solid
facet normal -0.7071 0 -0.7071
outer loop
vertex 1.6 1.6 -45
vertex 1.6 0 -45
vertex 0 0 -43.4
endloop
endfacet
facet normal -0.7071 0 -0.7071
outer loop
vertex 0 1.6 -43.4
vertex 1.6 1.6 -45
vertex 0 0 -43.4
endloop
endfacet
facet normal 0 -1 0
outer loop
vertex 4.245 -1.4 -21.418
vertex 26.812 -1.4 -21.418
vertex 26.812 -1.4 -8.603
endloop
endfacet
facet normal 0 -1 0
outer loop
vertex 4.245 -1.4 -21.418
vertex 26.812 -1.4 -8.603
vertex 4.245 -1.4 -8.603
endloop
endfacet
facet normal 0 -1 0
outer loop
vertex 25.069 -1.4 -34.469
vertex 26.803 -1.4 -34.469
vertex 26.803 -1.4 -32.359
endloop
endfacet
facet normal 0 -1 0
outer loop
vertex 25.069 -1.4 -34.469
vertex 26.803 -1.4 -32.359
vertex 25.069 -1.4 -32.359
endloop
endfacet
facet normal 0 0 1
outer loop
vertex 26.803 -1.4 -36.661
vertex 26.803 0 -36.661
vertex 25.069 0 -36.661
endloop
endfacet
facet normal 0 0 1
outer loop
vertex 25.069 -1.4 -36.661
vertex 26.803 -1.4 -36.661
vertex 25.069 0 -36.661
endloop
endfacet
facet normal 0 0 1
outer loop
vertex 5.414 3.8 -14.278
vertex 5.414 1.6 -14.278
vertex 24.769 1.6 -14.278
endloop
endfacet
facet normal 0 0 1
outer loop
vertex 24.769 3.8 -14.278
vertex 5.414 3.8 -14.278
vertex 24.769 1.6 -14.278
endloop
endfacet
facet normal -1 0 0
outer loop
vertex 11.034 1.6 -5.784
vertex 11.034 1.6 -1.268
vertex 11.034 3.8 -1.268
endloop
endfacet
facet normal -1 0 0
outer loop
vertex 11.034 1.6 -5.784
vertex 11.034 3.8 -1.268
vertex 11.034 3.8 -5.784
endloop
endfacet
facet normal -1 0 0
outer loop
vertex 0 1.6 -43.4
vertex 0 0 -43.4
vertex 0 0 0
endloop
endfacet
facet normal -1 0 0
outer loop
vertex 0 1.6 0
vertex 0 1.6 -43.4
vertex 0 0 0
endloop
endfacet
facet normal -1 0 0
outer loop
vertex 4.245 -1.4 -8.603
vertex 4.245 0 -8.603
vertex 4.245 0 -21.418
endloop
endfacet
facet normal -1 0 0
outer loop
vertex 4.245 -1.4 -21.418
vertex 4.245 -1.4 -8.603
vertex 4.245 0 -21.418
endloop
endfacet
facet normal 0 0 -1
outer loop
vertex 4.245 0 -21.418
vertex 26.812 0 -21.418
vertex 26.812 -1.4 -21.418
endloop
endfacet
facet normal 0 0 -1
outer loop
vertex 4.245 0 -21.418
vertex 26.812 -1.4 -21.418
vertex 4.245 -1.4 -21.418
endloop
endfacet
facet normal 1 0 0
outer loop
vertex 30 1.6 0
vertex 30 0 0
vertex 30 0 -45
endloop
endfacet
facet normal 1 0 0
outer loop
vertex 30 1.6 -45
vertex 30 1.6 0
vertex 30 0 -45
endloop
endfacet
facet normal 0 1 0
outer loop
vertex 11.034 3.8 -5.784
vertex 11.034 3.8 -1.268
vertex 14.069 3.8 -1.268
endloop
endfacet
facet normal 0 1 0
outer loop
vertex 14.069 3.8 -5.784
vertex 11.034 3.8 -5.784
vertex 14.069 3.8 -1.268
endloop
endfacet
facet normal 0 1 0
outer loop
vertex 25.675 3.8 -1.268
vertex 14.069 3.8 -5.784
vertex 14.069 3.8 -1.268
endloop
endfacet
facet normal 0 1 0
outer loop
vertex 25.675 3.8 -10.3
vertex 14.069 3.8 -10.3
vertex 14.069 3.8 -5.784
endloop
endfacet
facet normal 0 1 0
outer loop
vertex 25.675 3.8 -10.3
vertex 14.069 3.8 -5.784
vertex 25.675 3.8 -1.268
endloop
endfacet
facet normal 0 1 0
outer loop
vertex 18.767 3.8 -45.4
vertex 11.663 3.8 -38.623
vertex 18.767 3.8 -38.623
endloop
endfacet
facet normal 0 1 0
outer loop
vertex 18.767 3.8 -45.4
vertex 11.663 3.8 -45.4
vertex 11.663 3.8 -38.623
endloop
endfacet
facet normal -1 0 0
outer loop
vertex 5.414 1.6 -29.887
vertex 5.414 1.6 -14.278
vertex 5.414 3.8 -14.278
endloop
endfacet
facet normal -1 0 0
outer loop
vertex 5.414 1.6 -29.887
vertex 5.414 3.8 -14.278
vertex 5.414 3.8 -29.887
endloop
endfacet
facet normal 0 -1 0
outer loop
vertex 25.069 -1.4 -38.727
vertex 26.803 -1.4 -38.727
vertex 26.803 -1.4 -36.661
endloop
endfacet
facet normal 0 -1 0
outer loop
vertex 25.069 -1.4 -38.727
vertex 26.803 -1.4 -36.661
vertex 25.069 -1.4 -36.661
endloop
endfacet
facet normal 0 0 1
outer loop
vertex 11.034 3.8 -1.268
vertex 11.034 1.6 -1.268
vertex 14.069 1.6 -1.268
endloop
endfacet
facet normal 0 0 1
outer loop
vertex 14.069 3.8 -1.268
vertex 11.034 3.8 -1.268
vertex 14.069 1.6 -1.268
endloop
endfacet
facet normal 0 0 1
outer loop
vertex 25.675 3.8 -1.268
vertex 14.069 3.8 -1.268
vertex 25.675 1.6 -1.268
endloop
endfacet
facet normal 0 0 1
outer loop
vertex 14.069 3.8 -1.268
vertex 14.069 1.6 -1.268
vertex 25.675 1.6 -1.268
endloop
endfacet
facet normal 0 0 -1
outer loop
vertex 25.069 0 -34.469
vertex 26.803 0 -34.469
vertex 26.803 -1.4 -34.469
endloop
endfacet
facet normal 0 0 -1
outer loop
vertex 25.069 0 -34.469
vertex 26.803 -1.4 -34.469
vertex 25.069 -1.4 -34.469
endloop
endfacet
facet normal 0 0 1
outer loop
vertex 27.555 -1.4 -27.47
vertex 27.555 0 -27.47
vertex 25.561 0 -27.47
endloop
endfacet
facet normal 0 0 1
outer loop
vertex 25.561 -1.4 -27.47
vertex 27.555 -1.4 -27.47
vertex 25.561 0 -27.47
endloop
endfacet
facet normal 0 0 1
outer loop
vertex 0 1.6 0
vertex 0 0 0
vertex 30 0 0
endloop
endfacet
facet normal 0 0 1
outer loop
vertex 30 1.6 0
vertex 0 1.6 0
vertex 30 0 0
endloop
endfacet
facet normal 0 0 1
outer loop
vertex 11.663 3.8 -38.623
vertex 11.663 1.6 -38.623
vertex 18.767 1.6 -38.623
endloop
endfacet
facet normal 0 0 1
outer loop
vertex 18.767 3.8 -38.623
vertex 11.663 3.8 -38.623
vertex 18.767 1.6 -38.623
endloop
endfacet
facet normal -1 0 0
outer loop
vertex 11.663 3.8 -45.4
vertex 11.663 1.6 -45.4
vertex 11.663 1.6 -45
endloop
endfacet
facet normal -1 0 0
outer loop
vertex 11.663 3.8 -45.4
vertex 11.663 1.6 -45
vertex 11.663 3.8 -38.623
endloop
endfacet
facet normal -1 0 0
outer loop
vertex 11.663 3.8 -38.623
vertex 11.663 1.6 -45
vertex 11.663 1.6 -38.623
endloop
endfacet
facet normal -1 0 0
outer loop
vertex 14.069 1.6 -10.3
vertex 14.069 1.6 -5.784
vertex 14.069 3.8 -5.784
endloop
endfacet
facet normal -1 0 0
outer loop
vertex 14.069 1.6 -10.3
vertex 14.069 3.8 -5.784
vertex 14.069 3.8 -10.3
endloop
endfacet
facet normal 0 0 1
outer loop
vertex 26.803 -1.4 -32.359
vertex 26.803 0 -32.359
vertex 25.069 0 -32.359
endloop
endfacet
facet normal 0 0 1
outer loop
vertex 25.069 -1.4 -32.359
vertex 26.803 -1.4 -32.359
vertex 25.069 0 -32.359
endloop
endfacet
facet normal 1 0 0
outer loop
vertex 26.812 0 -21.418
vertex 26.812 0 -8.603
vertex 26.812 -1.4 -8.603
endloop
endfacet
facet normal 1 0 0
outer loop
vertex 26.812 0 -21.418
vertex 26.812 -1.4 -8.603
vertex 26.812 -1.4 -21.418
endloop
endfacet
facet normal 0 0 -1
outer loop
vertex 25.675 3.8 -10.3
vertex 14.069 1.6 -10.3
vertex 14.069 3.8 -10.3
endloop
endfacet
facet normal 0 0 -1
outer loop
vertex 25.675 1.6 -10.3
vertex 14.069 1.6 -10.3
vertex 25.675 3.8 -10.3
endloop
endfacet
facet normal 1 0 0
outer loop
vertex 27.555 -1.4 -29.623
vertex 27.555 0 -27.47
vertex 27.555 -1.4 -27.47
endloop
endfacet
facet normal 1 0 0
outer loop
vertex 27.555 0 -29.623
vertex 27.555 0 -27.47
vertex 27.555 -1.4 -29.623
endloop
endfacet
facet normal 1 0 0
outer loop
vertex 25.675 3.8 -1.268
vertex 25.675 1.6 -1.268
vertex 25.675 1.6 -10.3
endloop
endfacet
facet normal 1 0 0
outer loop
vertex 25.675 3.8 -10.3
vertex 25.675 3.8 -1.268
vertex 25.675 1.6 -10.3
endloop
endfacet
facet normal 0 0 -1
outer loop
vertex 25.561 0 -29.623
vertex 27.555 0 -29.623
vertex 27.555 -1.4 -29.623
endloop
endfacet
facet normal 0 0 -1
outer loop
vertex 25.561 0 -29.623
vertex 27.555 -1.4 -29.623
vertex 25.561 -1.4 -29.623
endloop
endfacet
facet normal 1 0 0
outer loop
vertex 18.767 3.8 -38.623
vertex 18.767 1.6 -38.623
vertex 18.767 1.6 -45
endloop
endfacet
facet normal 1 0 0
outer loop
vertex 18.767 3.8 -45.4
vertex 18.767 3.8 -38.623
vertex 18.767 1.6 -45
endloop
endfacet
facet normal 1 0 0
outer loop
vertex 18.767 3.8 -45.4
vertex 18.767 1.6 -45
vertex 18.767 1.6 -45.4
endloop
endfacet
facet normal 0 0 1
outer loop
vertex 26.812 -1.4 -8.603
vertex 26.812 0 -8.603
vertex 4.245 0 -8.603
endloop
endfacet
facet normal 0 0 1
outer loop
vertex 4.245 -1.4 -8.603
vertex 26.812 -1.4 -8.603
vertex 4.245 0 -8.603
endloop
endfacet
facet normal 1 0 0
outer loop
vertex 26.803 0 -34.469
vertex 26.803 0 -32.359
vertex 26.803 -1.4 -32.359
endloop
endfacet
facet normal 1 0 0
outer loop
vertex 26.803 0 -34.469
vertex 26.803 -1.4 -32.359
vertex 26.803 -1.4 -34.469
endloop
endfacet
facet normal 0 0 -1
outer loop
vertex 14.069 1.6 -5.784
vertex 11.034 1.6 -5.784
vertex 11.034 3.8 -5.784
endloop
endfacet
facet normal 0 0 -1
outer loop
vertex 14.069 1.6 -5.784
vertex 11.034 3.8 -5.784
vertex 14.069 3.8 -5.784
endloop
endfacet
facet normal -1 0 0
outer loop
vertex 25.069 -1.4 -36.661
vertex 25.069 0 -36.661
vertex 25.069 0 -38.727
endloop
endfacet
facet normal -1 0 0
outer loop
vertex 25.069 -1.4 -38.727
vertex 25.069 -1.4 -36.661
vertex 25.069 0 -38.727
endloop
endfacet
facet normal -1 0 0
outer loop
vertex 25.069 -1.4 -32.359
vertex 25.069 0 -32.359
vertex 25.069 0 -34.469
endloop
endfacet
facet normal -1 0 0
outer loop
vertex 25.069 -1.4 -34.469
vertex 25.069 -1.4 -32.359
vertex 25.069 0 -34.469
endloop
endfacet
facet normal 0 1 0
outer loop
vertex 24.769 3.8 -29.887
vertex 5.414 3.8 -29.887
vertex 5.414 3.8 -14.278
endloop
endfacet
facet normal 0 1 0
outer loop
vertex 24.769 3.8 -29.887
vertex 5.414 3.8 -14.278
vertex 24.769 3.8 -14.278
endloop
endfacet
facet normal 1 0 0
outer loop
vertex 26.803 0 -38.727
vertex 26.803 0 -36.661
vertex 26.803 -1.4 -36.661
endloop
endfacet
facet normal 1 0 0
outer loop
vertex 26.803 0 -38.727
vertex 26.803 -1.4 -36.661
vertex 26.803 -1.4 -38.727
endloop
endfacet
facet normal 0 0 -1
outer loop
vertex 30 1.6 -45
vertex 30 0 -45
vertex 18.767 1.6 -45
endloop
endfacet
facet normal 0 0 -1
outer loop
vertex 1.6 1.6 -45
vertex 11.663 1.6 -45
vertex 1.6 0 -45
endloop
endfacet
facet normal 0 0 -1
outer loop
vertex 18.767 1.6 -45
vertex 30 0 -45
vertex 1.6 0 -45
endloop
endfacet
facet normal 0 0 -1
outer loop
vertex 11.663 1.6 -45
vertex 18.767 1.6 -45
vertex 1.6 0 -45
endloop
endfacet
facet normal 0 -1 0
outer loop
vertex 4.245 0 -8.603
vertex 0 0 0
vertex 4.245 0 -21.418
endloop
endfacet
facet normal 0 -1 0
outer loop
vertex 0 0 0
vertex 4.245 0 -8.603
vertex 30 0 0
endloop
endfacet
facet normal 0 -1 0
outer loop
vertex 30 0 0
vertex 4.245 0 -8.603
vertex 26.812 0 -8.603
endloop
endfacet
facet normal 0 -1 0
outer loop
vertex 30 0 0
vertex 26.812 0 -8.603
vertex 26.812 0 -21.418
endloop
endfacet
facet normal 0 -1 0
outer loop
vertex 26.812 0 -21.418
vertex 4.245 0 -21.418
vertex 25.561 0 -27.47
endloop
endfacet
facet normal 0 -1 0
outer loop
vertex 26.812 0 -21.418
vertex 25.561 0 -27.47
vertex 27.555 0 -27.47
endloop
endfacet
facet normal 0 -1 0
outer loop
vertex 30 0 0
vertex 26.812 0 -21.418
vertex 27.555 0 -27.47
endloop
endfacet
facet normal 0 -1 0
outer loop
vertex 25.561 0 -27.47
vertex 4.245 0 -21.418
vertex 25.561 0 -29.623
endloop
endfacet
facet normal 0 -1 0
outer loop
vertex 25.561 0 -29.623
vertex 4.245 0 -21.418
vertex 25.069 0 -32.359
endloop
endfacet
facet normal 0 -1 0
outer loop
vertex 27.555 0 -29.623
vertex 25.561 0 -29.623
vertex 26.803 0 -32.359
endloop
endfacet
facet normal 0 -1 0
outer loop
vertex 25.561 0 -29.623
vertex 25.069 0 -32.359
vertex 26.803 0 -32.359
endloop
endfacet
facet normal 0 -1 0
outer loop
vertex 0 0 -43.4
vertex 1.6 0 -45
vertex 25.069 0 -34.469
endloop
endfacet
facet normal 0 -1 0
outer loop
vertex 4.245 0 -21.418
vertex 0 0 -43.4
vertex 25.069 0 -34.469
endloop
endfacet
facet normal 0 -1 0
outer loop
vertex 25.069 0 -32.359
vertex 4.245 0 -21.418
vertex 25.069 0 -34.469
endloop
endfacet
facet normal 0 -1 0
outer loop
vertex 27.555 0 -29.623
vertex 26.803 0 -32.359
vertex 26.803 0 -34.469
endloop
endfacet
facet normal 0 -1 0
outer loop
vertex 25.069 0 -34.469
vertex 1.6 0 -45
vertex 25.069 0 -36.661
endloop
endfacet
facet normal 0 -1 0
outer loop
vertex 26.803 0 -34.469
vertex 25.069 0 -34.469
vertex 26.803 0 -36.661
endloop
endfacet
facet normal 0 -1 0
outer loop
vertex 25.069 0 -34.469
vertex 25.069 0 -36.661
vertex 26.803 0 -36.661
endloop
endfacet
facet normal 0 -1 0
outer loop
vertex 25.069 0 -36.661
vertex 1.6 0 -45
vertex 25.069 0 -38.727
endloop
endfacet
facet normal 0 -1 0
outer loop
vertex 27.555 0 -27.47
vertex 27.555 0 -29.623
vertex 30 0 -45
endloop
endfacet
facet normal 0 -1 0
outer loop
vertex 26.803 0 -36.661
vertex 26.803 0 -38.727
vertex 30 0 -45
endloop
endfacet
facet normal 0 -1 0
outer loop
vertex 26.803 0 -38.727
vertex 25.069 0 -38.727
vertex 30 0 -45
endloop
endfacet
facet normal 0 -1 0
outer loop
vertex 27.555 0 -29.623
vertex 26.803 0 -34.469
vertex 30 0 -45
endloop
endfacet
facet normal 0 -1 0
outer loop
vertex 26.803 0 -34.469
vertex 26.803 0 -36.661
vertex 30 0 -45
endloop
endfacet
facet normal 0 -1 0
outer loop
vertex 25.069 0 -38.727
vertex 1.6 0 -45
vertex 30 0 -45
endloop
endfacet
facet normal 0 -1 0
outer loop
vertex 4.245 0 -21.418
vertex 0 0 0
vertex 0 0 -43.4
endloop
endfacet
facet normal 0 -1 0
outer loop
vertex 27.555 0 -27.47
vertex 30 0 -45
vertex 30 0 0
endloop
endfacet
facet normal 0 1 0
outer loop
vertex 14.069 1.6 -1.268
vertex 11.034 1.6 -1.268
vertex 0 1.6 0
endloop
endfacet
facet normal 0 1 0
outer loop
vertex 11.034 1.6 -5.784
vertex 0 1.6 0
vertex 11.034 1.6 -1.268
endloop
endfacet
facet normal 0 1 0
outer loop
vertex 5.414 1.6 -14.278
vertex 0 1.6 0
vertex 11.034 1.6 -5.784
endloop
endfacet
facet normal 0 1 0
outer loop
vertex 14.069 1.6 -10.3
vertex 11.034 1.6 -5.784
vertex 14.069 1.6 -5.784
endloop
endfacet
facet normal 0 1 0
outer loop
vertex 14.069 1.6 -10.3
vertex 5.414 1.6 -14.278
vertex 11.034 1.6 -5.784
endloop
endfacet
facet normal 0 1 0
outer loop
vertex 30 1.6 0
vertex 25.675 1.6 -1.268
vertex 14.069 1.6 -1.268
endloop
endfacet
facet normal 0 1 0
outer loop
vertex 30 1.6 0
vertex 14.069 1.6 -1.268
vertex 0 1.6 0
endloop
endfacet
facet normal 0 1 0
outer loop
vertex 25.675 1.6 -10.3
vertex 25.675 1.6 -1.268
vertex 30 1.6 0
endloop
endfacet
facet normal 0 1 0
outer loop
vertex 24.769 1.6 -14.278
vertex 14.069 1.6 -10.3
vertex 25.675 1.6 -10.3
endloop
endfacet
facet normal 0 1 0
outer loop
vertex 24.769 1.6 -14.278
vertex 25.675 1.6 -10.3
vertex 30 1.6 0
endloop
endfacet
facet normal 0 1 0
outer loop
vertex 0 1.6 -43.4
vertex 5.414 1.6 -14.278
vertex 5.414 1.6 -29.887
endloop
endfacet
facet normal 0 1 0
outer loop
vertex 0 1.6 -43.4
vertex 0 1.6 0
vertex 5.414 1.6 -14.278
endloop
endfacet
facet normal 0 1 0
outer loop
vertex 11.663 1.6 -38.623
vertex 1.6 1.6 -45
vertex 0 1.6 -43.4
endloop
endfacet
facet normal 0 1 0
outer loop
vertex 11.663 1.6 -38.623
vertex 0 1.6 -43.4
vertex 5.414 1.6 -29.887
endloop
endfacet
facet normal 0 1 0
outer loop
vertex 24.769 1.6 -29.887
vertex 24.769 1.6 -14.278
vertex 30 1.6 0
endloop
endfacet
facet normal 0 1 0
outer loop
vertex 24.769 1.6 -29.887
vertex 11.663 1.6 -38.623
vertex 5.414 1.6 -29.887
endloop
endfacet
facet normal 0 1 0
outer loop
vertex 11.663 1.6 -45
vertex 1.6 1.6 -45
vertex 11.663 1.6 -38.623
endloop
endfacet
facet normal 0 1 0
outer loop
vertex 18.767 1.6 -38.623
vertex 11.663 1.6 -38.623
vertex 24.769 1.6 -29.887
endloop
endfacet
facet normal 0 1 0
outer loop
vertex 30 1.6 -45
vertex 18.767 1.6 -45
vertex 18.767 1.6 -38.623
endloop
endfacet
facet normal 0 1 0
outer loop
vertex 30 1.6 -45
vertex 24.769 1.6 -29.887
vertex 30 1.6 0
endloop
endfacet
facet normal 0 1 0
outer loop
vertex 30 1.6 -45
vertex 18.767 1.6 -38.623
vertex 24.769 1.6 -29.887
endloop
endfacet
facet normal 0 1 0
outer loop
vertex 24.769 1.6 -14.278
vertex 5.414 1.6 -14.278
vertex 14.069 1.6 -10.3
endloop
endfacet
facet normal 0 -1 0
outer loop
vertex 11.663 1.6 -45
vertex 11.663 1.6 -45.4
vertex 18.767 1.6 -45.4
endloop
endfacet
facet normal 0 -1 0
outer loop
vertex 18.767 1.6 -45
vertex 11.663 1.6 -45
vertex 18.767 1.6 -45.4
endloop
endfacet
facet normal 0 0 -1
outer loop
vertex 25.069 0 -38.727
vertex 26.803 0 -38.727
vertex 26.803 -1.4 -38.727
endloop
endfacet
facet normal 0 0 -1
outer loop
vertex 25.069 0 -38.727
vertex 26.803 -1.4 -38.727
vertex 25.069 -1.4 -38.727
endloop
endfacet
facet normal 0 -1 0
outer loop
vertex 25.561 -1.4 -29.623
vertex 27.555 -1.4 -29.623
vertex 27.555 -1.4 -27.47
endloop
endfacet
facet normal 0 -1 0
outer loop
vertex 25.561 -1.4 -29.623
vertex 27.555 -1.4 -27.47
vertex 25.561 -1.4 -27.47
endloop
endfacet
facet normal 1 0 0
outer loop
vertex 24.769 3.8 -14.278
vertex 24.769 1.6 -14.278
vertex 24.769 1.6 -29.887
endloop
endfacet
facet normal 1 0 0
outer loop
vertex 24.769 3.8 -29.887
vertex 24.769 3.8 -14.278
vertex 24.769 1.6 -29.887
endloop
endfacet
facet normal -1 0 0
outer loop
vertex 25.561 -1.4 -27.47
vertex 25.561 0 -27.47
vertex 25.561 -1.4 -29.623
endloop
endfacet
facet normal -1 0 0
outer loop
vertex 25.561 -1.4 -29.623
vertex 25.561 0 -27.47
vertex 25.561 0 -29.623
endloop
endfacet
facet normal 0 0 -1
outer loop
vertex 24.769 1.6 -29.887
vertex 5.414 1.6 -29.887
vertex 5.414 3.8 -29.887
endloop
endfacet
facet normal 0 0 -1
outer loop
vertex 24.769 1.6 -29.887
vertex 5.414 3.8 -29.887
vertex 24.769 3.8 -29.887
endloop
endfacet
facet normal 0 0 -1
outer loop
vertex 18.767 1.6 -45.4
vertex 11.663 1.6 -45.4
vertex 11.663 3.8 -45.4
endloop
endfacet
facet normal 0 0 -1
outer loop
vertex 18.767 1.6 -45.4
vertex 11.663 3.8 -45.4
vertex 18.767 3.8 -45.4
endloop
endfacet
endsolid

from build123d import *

# Parameters (mm, degrees)
BOSS_EXTRUDE1_DEPTH = 1.6
SKETCH3_W           = 19.355079094
SKETCH3_H           = 15.609116434
BOSS_EXTRUDE2_DEPTH = 2.2
SKETCH4_W           = 7.104895368
SKETCH4_H           = 6.377418
SKETCH4_H_2         = 0.4
BOSS_EXTRUDE4_DEPTH = 2.2
SKETCH5_W           = 22.566472962
SKETCH5_H           = 12.815854083
BOSS_EXTRUDE5_DEPTH = 1.4
SKETCH6_W           = 1.734301273
SKETCH6_H           = 2.066889472
SKETCH6_H_2         = 2.110641646
SKETCH6_W_2         = 1.994894676
SKETCH6_H_3         = 2.153908206
BOSS_EXTRUDE6_DEPTH = 1.4
SKETCH7_W           = 11.606028653
SKETCH7_H           = 9.032244077
SKETCH7_W_2         = 3.035472579
SKETCH7_H_2         = 4.516122038
BOSS_EXTRUDE7_DEPTH = 2.2


with BuildPart() as part:
    # Sketch2 → Boss-Extrude1 (new body)
    with BuildSketch(Plane(origin=(0, 0, 0), x_dir=(1, 0, 0), z_dir=(0, 1, 0))):
        Polygon((1.6, 45), (0, 43.4), (0, 0), (30, 0), (30, 45), align=None)
    extrude(amount=BOSS_EXTRUDE1_DEPTH)

    # Sketch3 → Boss-Extrude2 (add)
    with BuildSketch(Plane(origin=(0, 1.6, 0), x_dir=(1, 0, 0), z_dir=(0, 1, 0))):
        with Locations((15.091884819, 22.082133677)):
            Rectangle(SKETCH3_W, SKETCH3_H)
    extrude(amount=BOSS_EXTRUDE2_DEPTH)

    # Sketch4 → Boss-Extrude4 (add)
    with BuildSketch(Plane(origin=(0, 1.6, 0), x_dir=(1, 0, 0), z_dir=(0, 1, 0))):
        with Locations((15.215017688, 41.811291)):
            Rectangle(SKETCH4_W, SKETCH4_H)
        with Locations((15.215017688, 45.2)):
            Rectangle(SKETCH4_W, SKETCH4_H_2)
    extrude(amount=BOSS_EXTRUDE4_DEPTH)

    # Sketch5 → Boss-Extrude5 (add)
    with BuildSketch(Plane(origin=(0, 0, 0), x_dir=(-1, 0, 0), z_dir=(0, -1, 0))):
        with Locations((-15.528488828, 15.010487551)):
            Rectangle(SKETCH5_W, SKETCH5_H)
    extrude(amount=BOSS_EXTRUDE5_DEPTH)

    # Sketch6 → Boss-Extrude6 (add)
    with BuildSketch(Plane(origin=(0, 0, 0), x_dir=(-1, 0, 0), z_dir=(0, -1, 0))):
        with Locations((-25.936328658, 37.693998436)):
            Rectangle(SKETCH6_W, SKETCH6_H)
        with Locations((-25.936328658, 33.41406102)):
            Rectangle(SKETCH6_W, SKETCH6_H_2)
        with Locations((-26.557976159, 28.546467775)):
            Rectangle(SKETCH6_W_2, SKETCH6_H_3)
    extrude(amount=BOSS_EXTRUDE6_DEPTH)

    # Sketch7 → Boss-Extrude7 (add)
    with BuildSketch(Plane(origin=(0, 1.6, 0), x_dir=(1, 0, 0), z_dir=(0, 1, 0))):
        with Locations((19.872075949, 5.78373458)):
            Rectangle(SKETCH7_W, SKETCH7_H)
        with Locations((12.551325333, 3.52567356)):
            Rectangle(SKETCH7_W_2, SKETCH7_H_2)
    extrude(amount=BOSS_EXTRUDE7_DEPTH)


solid = part.part
